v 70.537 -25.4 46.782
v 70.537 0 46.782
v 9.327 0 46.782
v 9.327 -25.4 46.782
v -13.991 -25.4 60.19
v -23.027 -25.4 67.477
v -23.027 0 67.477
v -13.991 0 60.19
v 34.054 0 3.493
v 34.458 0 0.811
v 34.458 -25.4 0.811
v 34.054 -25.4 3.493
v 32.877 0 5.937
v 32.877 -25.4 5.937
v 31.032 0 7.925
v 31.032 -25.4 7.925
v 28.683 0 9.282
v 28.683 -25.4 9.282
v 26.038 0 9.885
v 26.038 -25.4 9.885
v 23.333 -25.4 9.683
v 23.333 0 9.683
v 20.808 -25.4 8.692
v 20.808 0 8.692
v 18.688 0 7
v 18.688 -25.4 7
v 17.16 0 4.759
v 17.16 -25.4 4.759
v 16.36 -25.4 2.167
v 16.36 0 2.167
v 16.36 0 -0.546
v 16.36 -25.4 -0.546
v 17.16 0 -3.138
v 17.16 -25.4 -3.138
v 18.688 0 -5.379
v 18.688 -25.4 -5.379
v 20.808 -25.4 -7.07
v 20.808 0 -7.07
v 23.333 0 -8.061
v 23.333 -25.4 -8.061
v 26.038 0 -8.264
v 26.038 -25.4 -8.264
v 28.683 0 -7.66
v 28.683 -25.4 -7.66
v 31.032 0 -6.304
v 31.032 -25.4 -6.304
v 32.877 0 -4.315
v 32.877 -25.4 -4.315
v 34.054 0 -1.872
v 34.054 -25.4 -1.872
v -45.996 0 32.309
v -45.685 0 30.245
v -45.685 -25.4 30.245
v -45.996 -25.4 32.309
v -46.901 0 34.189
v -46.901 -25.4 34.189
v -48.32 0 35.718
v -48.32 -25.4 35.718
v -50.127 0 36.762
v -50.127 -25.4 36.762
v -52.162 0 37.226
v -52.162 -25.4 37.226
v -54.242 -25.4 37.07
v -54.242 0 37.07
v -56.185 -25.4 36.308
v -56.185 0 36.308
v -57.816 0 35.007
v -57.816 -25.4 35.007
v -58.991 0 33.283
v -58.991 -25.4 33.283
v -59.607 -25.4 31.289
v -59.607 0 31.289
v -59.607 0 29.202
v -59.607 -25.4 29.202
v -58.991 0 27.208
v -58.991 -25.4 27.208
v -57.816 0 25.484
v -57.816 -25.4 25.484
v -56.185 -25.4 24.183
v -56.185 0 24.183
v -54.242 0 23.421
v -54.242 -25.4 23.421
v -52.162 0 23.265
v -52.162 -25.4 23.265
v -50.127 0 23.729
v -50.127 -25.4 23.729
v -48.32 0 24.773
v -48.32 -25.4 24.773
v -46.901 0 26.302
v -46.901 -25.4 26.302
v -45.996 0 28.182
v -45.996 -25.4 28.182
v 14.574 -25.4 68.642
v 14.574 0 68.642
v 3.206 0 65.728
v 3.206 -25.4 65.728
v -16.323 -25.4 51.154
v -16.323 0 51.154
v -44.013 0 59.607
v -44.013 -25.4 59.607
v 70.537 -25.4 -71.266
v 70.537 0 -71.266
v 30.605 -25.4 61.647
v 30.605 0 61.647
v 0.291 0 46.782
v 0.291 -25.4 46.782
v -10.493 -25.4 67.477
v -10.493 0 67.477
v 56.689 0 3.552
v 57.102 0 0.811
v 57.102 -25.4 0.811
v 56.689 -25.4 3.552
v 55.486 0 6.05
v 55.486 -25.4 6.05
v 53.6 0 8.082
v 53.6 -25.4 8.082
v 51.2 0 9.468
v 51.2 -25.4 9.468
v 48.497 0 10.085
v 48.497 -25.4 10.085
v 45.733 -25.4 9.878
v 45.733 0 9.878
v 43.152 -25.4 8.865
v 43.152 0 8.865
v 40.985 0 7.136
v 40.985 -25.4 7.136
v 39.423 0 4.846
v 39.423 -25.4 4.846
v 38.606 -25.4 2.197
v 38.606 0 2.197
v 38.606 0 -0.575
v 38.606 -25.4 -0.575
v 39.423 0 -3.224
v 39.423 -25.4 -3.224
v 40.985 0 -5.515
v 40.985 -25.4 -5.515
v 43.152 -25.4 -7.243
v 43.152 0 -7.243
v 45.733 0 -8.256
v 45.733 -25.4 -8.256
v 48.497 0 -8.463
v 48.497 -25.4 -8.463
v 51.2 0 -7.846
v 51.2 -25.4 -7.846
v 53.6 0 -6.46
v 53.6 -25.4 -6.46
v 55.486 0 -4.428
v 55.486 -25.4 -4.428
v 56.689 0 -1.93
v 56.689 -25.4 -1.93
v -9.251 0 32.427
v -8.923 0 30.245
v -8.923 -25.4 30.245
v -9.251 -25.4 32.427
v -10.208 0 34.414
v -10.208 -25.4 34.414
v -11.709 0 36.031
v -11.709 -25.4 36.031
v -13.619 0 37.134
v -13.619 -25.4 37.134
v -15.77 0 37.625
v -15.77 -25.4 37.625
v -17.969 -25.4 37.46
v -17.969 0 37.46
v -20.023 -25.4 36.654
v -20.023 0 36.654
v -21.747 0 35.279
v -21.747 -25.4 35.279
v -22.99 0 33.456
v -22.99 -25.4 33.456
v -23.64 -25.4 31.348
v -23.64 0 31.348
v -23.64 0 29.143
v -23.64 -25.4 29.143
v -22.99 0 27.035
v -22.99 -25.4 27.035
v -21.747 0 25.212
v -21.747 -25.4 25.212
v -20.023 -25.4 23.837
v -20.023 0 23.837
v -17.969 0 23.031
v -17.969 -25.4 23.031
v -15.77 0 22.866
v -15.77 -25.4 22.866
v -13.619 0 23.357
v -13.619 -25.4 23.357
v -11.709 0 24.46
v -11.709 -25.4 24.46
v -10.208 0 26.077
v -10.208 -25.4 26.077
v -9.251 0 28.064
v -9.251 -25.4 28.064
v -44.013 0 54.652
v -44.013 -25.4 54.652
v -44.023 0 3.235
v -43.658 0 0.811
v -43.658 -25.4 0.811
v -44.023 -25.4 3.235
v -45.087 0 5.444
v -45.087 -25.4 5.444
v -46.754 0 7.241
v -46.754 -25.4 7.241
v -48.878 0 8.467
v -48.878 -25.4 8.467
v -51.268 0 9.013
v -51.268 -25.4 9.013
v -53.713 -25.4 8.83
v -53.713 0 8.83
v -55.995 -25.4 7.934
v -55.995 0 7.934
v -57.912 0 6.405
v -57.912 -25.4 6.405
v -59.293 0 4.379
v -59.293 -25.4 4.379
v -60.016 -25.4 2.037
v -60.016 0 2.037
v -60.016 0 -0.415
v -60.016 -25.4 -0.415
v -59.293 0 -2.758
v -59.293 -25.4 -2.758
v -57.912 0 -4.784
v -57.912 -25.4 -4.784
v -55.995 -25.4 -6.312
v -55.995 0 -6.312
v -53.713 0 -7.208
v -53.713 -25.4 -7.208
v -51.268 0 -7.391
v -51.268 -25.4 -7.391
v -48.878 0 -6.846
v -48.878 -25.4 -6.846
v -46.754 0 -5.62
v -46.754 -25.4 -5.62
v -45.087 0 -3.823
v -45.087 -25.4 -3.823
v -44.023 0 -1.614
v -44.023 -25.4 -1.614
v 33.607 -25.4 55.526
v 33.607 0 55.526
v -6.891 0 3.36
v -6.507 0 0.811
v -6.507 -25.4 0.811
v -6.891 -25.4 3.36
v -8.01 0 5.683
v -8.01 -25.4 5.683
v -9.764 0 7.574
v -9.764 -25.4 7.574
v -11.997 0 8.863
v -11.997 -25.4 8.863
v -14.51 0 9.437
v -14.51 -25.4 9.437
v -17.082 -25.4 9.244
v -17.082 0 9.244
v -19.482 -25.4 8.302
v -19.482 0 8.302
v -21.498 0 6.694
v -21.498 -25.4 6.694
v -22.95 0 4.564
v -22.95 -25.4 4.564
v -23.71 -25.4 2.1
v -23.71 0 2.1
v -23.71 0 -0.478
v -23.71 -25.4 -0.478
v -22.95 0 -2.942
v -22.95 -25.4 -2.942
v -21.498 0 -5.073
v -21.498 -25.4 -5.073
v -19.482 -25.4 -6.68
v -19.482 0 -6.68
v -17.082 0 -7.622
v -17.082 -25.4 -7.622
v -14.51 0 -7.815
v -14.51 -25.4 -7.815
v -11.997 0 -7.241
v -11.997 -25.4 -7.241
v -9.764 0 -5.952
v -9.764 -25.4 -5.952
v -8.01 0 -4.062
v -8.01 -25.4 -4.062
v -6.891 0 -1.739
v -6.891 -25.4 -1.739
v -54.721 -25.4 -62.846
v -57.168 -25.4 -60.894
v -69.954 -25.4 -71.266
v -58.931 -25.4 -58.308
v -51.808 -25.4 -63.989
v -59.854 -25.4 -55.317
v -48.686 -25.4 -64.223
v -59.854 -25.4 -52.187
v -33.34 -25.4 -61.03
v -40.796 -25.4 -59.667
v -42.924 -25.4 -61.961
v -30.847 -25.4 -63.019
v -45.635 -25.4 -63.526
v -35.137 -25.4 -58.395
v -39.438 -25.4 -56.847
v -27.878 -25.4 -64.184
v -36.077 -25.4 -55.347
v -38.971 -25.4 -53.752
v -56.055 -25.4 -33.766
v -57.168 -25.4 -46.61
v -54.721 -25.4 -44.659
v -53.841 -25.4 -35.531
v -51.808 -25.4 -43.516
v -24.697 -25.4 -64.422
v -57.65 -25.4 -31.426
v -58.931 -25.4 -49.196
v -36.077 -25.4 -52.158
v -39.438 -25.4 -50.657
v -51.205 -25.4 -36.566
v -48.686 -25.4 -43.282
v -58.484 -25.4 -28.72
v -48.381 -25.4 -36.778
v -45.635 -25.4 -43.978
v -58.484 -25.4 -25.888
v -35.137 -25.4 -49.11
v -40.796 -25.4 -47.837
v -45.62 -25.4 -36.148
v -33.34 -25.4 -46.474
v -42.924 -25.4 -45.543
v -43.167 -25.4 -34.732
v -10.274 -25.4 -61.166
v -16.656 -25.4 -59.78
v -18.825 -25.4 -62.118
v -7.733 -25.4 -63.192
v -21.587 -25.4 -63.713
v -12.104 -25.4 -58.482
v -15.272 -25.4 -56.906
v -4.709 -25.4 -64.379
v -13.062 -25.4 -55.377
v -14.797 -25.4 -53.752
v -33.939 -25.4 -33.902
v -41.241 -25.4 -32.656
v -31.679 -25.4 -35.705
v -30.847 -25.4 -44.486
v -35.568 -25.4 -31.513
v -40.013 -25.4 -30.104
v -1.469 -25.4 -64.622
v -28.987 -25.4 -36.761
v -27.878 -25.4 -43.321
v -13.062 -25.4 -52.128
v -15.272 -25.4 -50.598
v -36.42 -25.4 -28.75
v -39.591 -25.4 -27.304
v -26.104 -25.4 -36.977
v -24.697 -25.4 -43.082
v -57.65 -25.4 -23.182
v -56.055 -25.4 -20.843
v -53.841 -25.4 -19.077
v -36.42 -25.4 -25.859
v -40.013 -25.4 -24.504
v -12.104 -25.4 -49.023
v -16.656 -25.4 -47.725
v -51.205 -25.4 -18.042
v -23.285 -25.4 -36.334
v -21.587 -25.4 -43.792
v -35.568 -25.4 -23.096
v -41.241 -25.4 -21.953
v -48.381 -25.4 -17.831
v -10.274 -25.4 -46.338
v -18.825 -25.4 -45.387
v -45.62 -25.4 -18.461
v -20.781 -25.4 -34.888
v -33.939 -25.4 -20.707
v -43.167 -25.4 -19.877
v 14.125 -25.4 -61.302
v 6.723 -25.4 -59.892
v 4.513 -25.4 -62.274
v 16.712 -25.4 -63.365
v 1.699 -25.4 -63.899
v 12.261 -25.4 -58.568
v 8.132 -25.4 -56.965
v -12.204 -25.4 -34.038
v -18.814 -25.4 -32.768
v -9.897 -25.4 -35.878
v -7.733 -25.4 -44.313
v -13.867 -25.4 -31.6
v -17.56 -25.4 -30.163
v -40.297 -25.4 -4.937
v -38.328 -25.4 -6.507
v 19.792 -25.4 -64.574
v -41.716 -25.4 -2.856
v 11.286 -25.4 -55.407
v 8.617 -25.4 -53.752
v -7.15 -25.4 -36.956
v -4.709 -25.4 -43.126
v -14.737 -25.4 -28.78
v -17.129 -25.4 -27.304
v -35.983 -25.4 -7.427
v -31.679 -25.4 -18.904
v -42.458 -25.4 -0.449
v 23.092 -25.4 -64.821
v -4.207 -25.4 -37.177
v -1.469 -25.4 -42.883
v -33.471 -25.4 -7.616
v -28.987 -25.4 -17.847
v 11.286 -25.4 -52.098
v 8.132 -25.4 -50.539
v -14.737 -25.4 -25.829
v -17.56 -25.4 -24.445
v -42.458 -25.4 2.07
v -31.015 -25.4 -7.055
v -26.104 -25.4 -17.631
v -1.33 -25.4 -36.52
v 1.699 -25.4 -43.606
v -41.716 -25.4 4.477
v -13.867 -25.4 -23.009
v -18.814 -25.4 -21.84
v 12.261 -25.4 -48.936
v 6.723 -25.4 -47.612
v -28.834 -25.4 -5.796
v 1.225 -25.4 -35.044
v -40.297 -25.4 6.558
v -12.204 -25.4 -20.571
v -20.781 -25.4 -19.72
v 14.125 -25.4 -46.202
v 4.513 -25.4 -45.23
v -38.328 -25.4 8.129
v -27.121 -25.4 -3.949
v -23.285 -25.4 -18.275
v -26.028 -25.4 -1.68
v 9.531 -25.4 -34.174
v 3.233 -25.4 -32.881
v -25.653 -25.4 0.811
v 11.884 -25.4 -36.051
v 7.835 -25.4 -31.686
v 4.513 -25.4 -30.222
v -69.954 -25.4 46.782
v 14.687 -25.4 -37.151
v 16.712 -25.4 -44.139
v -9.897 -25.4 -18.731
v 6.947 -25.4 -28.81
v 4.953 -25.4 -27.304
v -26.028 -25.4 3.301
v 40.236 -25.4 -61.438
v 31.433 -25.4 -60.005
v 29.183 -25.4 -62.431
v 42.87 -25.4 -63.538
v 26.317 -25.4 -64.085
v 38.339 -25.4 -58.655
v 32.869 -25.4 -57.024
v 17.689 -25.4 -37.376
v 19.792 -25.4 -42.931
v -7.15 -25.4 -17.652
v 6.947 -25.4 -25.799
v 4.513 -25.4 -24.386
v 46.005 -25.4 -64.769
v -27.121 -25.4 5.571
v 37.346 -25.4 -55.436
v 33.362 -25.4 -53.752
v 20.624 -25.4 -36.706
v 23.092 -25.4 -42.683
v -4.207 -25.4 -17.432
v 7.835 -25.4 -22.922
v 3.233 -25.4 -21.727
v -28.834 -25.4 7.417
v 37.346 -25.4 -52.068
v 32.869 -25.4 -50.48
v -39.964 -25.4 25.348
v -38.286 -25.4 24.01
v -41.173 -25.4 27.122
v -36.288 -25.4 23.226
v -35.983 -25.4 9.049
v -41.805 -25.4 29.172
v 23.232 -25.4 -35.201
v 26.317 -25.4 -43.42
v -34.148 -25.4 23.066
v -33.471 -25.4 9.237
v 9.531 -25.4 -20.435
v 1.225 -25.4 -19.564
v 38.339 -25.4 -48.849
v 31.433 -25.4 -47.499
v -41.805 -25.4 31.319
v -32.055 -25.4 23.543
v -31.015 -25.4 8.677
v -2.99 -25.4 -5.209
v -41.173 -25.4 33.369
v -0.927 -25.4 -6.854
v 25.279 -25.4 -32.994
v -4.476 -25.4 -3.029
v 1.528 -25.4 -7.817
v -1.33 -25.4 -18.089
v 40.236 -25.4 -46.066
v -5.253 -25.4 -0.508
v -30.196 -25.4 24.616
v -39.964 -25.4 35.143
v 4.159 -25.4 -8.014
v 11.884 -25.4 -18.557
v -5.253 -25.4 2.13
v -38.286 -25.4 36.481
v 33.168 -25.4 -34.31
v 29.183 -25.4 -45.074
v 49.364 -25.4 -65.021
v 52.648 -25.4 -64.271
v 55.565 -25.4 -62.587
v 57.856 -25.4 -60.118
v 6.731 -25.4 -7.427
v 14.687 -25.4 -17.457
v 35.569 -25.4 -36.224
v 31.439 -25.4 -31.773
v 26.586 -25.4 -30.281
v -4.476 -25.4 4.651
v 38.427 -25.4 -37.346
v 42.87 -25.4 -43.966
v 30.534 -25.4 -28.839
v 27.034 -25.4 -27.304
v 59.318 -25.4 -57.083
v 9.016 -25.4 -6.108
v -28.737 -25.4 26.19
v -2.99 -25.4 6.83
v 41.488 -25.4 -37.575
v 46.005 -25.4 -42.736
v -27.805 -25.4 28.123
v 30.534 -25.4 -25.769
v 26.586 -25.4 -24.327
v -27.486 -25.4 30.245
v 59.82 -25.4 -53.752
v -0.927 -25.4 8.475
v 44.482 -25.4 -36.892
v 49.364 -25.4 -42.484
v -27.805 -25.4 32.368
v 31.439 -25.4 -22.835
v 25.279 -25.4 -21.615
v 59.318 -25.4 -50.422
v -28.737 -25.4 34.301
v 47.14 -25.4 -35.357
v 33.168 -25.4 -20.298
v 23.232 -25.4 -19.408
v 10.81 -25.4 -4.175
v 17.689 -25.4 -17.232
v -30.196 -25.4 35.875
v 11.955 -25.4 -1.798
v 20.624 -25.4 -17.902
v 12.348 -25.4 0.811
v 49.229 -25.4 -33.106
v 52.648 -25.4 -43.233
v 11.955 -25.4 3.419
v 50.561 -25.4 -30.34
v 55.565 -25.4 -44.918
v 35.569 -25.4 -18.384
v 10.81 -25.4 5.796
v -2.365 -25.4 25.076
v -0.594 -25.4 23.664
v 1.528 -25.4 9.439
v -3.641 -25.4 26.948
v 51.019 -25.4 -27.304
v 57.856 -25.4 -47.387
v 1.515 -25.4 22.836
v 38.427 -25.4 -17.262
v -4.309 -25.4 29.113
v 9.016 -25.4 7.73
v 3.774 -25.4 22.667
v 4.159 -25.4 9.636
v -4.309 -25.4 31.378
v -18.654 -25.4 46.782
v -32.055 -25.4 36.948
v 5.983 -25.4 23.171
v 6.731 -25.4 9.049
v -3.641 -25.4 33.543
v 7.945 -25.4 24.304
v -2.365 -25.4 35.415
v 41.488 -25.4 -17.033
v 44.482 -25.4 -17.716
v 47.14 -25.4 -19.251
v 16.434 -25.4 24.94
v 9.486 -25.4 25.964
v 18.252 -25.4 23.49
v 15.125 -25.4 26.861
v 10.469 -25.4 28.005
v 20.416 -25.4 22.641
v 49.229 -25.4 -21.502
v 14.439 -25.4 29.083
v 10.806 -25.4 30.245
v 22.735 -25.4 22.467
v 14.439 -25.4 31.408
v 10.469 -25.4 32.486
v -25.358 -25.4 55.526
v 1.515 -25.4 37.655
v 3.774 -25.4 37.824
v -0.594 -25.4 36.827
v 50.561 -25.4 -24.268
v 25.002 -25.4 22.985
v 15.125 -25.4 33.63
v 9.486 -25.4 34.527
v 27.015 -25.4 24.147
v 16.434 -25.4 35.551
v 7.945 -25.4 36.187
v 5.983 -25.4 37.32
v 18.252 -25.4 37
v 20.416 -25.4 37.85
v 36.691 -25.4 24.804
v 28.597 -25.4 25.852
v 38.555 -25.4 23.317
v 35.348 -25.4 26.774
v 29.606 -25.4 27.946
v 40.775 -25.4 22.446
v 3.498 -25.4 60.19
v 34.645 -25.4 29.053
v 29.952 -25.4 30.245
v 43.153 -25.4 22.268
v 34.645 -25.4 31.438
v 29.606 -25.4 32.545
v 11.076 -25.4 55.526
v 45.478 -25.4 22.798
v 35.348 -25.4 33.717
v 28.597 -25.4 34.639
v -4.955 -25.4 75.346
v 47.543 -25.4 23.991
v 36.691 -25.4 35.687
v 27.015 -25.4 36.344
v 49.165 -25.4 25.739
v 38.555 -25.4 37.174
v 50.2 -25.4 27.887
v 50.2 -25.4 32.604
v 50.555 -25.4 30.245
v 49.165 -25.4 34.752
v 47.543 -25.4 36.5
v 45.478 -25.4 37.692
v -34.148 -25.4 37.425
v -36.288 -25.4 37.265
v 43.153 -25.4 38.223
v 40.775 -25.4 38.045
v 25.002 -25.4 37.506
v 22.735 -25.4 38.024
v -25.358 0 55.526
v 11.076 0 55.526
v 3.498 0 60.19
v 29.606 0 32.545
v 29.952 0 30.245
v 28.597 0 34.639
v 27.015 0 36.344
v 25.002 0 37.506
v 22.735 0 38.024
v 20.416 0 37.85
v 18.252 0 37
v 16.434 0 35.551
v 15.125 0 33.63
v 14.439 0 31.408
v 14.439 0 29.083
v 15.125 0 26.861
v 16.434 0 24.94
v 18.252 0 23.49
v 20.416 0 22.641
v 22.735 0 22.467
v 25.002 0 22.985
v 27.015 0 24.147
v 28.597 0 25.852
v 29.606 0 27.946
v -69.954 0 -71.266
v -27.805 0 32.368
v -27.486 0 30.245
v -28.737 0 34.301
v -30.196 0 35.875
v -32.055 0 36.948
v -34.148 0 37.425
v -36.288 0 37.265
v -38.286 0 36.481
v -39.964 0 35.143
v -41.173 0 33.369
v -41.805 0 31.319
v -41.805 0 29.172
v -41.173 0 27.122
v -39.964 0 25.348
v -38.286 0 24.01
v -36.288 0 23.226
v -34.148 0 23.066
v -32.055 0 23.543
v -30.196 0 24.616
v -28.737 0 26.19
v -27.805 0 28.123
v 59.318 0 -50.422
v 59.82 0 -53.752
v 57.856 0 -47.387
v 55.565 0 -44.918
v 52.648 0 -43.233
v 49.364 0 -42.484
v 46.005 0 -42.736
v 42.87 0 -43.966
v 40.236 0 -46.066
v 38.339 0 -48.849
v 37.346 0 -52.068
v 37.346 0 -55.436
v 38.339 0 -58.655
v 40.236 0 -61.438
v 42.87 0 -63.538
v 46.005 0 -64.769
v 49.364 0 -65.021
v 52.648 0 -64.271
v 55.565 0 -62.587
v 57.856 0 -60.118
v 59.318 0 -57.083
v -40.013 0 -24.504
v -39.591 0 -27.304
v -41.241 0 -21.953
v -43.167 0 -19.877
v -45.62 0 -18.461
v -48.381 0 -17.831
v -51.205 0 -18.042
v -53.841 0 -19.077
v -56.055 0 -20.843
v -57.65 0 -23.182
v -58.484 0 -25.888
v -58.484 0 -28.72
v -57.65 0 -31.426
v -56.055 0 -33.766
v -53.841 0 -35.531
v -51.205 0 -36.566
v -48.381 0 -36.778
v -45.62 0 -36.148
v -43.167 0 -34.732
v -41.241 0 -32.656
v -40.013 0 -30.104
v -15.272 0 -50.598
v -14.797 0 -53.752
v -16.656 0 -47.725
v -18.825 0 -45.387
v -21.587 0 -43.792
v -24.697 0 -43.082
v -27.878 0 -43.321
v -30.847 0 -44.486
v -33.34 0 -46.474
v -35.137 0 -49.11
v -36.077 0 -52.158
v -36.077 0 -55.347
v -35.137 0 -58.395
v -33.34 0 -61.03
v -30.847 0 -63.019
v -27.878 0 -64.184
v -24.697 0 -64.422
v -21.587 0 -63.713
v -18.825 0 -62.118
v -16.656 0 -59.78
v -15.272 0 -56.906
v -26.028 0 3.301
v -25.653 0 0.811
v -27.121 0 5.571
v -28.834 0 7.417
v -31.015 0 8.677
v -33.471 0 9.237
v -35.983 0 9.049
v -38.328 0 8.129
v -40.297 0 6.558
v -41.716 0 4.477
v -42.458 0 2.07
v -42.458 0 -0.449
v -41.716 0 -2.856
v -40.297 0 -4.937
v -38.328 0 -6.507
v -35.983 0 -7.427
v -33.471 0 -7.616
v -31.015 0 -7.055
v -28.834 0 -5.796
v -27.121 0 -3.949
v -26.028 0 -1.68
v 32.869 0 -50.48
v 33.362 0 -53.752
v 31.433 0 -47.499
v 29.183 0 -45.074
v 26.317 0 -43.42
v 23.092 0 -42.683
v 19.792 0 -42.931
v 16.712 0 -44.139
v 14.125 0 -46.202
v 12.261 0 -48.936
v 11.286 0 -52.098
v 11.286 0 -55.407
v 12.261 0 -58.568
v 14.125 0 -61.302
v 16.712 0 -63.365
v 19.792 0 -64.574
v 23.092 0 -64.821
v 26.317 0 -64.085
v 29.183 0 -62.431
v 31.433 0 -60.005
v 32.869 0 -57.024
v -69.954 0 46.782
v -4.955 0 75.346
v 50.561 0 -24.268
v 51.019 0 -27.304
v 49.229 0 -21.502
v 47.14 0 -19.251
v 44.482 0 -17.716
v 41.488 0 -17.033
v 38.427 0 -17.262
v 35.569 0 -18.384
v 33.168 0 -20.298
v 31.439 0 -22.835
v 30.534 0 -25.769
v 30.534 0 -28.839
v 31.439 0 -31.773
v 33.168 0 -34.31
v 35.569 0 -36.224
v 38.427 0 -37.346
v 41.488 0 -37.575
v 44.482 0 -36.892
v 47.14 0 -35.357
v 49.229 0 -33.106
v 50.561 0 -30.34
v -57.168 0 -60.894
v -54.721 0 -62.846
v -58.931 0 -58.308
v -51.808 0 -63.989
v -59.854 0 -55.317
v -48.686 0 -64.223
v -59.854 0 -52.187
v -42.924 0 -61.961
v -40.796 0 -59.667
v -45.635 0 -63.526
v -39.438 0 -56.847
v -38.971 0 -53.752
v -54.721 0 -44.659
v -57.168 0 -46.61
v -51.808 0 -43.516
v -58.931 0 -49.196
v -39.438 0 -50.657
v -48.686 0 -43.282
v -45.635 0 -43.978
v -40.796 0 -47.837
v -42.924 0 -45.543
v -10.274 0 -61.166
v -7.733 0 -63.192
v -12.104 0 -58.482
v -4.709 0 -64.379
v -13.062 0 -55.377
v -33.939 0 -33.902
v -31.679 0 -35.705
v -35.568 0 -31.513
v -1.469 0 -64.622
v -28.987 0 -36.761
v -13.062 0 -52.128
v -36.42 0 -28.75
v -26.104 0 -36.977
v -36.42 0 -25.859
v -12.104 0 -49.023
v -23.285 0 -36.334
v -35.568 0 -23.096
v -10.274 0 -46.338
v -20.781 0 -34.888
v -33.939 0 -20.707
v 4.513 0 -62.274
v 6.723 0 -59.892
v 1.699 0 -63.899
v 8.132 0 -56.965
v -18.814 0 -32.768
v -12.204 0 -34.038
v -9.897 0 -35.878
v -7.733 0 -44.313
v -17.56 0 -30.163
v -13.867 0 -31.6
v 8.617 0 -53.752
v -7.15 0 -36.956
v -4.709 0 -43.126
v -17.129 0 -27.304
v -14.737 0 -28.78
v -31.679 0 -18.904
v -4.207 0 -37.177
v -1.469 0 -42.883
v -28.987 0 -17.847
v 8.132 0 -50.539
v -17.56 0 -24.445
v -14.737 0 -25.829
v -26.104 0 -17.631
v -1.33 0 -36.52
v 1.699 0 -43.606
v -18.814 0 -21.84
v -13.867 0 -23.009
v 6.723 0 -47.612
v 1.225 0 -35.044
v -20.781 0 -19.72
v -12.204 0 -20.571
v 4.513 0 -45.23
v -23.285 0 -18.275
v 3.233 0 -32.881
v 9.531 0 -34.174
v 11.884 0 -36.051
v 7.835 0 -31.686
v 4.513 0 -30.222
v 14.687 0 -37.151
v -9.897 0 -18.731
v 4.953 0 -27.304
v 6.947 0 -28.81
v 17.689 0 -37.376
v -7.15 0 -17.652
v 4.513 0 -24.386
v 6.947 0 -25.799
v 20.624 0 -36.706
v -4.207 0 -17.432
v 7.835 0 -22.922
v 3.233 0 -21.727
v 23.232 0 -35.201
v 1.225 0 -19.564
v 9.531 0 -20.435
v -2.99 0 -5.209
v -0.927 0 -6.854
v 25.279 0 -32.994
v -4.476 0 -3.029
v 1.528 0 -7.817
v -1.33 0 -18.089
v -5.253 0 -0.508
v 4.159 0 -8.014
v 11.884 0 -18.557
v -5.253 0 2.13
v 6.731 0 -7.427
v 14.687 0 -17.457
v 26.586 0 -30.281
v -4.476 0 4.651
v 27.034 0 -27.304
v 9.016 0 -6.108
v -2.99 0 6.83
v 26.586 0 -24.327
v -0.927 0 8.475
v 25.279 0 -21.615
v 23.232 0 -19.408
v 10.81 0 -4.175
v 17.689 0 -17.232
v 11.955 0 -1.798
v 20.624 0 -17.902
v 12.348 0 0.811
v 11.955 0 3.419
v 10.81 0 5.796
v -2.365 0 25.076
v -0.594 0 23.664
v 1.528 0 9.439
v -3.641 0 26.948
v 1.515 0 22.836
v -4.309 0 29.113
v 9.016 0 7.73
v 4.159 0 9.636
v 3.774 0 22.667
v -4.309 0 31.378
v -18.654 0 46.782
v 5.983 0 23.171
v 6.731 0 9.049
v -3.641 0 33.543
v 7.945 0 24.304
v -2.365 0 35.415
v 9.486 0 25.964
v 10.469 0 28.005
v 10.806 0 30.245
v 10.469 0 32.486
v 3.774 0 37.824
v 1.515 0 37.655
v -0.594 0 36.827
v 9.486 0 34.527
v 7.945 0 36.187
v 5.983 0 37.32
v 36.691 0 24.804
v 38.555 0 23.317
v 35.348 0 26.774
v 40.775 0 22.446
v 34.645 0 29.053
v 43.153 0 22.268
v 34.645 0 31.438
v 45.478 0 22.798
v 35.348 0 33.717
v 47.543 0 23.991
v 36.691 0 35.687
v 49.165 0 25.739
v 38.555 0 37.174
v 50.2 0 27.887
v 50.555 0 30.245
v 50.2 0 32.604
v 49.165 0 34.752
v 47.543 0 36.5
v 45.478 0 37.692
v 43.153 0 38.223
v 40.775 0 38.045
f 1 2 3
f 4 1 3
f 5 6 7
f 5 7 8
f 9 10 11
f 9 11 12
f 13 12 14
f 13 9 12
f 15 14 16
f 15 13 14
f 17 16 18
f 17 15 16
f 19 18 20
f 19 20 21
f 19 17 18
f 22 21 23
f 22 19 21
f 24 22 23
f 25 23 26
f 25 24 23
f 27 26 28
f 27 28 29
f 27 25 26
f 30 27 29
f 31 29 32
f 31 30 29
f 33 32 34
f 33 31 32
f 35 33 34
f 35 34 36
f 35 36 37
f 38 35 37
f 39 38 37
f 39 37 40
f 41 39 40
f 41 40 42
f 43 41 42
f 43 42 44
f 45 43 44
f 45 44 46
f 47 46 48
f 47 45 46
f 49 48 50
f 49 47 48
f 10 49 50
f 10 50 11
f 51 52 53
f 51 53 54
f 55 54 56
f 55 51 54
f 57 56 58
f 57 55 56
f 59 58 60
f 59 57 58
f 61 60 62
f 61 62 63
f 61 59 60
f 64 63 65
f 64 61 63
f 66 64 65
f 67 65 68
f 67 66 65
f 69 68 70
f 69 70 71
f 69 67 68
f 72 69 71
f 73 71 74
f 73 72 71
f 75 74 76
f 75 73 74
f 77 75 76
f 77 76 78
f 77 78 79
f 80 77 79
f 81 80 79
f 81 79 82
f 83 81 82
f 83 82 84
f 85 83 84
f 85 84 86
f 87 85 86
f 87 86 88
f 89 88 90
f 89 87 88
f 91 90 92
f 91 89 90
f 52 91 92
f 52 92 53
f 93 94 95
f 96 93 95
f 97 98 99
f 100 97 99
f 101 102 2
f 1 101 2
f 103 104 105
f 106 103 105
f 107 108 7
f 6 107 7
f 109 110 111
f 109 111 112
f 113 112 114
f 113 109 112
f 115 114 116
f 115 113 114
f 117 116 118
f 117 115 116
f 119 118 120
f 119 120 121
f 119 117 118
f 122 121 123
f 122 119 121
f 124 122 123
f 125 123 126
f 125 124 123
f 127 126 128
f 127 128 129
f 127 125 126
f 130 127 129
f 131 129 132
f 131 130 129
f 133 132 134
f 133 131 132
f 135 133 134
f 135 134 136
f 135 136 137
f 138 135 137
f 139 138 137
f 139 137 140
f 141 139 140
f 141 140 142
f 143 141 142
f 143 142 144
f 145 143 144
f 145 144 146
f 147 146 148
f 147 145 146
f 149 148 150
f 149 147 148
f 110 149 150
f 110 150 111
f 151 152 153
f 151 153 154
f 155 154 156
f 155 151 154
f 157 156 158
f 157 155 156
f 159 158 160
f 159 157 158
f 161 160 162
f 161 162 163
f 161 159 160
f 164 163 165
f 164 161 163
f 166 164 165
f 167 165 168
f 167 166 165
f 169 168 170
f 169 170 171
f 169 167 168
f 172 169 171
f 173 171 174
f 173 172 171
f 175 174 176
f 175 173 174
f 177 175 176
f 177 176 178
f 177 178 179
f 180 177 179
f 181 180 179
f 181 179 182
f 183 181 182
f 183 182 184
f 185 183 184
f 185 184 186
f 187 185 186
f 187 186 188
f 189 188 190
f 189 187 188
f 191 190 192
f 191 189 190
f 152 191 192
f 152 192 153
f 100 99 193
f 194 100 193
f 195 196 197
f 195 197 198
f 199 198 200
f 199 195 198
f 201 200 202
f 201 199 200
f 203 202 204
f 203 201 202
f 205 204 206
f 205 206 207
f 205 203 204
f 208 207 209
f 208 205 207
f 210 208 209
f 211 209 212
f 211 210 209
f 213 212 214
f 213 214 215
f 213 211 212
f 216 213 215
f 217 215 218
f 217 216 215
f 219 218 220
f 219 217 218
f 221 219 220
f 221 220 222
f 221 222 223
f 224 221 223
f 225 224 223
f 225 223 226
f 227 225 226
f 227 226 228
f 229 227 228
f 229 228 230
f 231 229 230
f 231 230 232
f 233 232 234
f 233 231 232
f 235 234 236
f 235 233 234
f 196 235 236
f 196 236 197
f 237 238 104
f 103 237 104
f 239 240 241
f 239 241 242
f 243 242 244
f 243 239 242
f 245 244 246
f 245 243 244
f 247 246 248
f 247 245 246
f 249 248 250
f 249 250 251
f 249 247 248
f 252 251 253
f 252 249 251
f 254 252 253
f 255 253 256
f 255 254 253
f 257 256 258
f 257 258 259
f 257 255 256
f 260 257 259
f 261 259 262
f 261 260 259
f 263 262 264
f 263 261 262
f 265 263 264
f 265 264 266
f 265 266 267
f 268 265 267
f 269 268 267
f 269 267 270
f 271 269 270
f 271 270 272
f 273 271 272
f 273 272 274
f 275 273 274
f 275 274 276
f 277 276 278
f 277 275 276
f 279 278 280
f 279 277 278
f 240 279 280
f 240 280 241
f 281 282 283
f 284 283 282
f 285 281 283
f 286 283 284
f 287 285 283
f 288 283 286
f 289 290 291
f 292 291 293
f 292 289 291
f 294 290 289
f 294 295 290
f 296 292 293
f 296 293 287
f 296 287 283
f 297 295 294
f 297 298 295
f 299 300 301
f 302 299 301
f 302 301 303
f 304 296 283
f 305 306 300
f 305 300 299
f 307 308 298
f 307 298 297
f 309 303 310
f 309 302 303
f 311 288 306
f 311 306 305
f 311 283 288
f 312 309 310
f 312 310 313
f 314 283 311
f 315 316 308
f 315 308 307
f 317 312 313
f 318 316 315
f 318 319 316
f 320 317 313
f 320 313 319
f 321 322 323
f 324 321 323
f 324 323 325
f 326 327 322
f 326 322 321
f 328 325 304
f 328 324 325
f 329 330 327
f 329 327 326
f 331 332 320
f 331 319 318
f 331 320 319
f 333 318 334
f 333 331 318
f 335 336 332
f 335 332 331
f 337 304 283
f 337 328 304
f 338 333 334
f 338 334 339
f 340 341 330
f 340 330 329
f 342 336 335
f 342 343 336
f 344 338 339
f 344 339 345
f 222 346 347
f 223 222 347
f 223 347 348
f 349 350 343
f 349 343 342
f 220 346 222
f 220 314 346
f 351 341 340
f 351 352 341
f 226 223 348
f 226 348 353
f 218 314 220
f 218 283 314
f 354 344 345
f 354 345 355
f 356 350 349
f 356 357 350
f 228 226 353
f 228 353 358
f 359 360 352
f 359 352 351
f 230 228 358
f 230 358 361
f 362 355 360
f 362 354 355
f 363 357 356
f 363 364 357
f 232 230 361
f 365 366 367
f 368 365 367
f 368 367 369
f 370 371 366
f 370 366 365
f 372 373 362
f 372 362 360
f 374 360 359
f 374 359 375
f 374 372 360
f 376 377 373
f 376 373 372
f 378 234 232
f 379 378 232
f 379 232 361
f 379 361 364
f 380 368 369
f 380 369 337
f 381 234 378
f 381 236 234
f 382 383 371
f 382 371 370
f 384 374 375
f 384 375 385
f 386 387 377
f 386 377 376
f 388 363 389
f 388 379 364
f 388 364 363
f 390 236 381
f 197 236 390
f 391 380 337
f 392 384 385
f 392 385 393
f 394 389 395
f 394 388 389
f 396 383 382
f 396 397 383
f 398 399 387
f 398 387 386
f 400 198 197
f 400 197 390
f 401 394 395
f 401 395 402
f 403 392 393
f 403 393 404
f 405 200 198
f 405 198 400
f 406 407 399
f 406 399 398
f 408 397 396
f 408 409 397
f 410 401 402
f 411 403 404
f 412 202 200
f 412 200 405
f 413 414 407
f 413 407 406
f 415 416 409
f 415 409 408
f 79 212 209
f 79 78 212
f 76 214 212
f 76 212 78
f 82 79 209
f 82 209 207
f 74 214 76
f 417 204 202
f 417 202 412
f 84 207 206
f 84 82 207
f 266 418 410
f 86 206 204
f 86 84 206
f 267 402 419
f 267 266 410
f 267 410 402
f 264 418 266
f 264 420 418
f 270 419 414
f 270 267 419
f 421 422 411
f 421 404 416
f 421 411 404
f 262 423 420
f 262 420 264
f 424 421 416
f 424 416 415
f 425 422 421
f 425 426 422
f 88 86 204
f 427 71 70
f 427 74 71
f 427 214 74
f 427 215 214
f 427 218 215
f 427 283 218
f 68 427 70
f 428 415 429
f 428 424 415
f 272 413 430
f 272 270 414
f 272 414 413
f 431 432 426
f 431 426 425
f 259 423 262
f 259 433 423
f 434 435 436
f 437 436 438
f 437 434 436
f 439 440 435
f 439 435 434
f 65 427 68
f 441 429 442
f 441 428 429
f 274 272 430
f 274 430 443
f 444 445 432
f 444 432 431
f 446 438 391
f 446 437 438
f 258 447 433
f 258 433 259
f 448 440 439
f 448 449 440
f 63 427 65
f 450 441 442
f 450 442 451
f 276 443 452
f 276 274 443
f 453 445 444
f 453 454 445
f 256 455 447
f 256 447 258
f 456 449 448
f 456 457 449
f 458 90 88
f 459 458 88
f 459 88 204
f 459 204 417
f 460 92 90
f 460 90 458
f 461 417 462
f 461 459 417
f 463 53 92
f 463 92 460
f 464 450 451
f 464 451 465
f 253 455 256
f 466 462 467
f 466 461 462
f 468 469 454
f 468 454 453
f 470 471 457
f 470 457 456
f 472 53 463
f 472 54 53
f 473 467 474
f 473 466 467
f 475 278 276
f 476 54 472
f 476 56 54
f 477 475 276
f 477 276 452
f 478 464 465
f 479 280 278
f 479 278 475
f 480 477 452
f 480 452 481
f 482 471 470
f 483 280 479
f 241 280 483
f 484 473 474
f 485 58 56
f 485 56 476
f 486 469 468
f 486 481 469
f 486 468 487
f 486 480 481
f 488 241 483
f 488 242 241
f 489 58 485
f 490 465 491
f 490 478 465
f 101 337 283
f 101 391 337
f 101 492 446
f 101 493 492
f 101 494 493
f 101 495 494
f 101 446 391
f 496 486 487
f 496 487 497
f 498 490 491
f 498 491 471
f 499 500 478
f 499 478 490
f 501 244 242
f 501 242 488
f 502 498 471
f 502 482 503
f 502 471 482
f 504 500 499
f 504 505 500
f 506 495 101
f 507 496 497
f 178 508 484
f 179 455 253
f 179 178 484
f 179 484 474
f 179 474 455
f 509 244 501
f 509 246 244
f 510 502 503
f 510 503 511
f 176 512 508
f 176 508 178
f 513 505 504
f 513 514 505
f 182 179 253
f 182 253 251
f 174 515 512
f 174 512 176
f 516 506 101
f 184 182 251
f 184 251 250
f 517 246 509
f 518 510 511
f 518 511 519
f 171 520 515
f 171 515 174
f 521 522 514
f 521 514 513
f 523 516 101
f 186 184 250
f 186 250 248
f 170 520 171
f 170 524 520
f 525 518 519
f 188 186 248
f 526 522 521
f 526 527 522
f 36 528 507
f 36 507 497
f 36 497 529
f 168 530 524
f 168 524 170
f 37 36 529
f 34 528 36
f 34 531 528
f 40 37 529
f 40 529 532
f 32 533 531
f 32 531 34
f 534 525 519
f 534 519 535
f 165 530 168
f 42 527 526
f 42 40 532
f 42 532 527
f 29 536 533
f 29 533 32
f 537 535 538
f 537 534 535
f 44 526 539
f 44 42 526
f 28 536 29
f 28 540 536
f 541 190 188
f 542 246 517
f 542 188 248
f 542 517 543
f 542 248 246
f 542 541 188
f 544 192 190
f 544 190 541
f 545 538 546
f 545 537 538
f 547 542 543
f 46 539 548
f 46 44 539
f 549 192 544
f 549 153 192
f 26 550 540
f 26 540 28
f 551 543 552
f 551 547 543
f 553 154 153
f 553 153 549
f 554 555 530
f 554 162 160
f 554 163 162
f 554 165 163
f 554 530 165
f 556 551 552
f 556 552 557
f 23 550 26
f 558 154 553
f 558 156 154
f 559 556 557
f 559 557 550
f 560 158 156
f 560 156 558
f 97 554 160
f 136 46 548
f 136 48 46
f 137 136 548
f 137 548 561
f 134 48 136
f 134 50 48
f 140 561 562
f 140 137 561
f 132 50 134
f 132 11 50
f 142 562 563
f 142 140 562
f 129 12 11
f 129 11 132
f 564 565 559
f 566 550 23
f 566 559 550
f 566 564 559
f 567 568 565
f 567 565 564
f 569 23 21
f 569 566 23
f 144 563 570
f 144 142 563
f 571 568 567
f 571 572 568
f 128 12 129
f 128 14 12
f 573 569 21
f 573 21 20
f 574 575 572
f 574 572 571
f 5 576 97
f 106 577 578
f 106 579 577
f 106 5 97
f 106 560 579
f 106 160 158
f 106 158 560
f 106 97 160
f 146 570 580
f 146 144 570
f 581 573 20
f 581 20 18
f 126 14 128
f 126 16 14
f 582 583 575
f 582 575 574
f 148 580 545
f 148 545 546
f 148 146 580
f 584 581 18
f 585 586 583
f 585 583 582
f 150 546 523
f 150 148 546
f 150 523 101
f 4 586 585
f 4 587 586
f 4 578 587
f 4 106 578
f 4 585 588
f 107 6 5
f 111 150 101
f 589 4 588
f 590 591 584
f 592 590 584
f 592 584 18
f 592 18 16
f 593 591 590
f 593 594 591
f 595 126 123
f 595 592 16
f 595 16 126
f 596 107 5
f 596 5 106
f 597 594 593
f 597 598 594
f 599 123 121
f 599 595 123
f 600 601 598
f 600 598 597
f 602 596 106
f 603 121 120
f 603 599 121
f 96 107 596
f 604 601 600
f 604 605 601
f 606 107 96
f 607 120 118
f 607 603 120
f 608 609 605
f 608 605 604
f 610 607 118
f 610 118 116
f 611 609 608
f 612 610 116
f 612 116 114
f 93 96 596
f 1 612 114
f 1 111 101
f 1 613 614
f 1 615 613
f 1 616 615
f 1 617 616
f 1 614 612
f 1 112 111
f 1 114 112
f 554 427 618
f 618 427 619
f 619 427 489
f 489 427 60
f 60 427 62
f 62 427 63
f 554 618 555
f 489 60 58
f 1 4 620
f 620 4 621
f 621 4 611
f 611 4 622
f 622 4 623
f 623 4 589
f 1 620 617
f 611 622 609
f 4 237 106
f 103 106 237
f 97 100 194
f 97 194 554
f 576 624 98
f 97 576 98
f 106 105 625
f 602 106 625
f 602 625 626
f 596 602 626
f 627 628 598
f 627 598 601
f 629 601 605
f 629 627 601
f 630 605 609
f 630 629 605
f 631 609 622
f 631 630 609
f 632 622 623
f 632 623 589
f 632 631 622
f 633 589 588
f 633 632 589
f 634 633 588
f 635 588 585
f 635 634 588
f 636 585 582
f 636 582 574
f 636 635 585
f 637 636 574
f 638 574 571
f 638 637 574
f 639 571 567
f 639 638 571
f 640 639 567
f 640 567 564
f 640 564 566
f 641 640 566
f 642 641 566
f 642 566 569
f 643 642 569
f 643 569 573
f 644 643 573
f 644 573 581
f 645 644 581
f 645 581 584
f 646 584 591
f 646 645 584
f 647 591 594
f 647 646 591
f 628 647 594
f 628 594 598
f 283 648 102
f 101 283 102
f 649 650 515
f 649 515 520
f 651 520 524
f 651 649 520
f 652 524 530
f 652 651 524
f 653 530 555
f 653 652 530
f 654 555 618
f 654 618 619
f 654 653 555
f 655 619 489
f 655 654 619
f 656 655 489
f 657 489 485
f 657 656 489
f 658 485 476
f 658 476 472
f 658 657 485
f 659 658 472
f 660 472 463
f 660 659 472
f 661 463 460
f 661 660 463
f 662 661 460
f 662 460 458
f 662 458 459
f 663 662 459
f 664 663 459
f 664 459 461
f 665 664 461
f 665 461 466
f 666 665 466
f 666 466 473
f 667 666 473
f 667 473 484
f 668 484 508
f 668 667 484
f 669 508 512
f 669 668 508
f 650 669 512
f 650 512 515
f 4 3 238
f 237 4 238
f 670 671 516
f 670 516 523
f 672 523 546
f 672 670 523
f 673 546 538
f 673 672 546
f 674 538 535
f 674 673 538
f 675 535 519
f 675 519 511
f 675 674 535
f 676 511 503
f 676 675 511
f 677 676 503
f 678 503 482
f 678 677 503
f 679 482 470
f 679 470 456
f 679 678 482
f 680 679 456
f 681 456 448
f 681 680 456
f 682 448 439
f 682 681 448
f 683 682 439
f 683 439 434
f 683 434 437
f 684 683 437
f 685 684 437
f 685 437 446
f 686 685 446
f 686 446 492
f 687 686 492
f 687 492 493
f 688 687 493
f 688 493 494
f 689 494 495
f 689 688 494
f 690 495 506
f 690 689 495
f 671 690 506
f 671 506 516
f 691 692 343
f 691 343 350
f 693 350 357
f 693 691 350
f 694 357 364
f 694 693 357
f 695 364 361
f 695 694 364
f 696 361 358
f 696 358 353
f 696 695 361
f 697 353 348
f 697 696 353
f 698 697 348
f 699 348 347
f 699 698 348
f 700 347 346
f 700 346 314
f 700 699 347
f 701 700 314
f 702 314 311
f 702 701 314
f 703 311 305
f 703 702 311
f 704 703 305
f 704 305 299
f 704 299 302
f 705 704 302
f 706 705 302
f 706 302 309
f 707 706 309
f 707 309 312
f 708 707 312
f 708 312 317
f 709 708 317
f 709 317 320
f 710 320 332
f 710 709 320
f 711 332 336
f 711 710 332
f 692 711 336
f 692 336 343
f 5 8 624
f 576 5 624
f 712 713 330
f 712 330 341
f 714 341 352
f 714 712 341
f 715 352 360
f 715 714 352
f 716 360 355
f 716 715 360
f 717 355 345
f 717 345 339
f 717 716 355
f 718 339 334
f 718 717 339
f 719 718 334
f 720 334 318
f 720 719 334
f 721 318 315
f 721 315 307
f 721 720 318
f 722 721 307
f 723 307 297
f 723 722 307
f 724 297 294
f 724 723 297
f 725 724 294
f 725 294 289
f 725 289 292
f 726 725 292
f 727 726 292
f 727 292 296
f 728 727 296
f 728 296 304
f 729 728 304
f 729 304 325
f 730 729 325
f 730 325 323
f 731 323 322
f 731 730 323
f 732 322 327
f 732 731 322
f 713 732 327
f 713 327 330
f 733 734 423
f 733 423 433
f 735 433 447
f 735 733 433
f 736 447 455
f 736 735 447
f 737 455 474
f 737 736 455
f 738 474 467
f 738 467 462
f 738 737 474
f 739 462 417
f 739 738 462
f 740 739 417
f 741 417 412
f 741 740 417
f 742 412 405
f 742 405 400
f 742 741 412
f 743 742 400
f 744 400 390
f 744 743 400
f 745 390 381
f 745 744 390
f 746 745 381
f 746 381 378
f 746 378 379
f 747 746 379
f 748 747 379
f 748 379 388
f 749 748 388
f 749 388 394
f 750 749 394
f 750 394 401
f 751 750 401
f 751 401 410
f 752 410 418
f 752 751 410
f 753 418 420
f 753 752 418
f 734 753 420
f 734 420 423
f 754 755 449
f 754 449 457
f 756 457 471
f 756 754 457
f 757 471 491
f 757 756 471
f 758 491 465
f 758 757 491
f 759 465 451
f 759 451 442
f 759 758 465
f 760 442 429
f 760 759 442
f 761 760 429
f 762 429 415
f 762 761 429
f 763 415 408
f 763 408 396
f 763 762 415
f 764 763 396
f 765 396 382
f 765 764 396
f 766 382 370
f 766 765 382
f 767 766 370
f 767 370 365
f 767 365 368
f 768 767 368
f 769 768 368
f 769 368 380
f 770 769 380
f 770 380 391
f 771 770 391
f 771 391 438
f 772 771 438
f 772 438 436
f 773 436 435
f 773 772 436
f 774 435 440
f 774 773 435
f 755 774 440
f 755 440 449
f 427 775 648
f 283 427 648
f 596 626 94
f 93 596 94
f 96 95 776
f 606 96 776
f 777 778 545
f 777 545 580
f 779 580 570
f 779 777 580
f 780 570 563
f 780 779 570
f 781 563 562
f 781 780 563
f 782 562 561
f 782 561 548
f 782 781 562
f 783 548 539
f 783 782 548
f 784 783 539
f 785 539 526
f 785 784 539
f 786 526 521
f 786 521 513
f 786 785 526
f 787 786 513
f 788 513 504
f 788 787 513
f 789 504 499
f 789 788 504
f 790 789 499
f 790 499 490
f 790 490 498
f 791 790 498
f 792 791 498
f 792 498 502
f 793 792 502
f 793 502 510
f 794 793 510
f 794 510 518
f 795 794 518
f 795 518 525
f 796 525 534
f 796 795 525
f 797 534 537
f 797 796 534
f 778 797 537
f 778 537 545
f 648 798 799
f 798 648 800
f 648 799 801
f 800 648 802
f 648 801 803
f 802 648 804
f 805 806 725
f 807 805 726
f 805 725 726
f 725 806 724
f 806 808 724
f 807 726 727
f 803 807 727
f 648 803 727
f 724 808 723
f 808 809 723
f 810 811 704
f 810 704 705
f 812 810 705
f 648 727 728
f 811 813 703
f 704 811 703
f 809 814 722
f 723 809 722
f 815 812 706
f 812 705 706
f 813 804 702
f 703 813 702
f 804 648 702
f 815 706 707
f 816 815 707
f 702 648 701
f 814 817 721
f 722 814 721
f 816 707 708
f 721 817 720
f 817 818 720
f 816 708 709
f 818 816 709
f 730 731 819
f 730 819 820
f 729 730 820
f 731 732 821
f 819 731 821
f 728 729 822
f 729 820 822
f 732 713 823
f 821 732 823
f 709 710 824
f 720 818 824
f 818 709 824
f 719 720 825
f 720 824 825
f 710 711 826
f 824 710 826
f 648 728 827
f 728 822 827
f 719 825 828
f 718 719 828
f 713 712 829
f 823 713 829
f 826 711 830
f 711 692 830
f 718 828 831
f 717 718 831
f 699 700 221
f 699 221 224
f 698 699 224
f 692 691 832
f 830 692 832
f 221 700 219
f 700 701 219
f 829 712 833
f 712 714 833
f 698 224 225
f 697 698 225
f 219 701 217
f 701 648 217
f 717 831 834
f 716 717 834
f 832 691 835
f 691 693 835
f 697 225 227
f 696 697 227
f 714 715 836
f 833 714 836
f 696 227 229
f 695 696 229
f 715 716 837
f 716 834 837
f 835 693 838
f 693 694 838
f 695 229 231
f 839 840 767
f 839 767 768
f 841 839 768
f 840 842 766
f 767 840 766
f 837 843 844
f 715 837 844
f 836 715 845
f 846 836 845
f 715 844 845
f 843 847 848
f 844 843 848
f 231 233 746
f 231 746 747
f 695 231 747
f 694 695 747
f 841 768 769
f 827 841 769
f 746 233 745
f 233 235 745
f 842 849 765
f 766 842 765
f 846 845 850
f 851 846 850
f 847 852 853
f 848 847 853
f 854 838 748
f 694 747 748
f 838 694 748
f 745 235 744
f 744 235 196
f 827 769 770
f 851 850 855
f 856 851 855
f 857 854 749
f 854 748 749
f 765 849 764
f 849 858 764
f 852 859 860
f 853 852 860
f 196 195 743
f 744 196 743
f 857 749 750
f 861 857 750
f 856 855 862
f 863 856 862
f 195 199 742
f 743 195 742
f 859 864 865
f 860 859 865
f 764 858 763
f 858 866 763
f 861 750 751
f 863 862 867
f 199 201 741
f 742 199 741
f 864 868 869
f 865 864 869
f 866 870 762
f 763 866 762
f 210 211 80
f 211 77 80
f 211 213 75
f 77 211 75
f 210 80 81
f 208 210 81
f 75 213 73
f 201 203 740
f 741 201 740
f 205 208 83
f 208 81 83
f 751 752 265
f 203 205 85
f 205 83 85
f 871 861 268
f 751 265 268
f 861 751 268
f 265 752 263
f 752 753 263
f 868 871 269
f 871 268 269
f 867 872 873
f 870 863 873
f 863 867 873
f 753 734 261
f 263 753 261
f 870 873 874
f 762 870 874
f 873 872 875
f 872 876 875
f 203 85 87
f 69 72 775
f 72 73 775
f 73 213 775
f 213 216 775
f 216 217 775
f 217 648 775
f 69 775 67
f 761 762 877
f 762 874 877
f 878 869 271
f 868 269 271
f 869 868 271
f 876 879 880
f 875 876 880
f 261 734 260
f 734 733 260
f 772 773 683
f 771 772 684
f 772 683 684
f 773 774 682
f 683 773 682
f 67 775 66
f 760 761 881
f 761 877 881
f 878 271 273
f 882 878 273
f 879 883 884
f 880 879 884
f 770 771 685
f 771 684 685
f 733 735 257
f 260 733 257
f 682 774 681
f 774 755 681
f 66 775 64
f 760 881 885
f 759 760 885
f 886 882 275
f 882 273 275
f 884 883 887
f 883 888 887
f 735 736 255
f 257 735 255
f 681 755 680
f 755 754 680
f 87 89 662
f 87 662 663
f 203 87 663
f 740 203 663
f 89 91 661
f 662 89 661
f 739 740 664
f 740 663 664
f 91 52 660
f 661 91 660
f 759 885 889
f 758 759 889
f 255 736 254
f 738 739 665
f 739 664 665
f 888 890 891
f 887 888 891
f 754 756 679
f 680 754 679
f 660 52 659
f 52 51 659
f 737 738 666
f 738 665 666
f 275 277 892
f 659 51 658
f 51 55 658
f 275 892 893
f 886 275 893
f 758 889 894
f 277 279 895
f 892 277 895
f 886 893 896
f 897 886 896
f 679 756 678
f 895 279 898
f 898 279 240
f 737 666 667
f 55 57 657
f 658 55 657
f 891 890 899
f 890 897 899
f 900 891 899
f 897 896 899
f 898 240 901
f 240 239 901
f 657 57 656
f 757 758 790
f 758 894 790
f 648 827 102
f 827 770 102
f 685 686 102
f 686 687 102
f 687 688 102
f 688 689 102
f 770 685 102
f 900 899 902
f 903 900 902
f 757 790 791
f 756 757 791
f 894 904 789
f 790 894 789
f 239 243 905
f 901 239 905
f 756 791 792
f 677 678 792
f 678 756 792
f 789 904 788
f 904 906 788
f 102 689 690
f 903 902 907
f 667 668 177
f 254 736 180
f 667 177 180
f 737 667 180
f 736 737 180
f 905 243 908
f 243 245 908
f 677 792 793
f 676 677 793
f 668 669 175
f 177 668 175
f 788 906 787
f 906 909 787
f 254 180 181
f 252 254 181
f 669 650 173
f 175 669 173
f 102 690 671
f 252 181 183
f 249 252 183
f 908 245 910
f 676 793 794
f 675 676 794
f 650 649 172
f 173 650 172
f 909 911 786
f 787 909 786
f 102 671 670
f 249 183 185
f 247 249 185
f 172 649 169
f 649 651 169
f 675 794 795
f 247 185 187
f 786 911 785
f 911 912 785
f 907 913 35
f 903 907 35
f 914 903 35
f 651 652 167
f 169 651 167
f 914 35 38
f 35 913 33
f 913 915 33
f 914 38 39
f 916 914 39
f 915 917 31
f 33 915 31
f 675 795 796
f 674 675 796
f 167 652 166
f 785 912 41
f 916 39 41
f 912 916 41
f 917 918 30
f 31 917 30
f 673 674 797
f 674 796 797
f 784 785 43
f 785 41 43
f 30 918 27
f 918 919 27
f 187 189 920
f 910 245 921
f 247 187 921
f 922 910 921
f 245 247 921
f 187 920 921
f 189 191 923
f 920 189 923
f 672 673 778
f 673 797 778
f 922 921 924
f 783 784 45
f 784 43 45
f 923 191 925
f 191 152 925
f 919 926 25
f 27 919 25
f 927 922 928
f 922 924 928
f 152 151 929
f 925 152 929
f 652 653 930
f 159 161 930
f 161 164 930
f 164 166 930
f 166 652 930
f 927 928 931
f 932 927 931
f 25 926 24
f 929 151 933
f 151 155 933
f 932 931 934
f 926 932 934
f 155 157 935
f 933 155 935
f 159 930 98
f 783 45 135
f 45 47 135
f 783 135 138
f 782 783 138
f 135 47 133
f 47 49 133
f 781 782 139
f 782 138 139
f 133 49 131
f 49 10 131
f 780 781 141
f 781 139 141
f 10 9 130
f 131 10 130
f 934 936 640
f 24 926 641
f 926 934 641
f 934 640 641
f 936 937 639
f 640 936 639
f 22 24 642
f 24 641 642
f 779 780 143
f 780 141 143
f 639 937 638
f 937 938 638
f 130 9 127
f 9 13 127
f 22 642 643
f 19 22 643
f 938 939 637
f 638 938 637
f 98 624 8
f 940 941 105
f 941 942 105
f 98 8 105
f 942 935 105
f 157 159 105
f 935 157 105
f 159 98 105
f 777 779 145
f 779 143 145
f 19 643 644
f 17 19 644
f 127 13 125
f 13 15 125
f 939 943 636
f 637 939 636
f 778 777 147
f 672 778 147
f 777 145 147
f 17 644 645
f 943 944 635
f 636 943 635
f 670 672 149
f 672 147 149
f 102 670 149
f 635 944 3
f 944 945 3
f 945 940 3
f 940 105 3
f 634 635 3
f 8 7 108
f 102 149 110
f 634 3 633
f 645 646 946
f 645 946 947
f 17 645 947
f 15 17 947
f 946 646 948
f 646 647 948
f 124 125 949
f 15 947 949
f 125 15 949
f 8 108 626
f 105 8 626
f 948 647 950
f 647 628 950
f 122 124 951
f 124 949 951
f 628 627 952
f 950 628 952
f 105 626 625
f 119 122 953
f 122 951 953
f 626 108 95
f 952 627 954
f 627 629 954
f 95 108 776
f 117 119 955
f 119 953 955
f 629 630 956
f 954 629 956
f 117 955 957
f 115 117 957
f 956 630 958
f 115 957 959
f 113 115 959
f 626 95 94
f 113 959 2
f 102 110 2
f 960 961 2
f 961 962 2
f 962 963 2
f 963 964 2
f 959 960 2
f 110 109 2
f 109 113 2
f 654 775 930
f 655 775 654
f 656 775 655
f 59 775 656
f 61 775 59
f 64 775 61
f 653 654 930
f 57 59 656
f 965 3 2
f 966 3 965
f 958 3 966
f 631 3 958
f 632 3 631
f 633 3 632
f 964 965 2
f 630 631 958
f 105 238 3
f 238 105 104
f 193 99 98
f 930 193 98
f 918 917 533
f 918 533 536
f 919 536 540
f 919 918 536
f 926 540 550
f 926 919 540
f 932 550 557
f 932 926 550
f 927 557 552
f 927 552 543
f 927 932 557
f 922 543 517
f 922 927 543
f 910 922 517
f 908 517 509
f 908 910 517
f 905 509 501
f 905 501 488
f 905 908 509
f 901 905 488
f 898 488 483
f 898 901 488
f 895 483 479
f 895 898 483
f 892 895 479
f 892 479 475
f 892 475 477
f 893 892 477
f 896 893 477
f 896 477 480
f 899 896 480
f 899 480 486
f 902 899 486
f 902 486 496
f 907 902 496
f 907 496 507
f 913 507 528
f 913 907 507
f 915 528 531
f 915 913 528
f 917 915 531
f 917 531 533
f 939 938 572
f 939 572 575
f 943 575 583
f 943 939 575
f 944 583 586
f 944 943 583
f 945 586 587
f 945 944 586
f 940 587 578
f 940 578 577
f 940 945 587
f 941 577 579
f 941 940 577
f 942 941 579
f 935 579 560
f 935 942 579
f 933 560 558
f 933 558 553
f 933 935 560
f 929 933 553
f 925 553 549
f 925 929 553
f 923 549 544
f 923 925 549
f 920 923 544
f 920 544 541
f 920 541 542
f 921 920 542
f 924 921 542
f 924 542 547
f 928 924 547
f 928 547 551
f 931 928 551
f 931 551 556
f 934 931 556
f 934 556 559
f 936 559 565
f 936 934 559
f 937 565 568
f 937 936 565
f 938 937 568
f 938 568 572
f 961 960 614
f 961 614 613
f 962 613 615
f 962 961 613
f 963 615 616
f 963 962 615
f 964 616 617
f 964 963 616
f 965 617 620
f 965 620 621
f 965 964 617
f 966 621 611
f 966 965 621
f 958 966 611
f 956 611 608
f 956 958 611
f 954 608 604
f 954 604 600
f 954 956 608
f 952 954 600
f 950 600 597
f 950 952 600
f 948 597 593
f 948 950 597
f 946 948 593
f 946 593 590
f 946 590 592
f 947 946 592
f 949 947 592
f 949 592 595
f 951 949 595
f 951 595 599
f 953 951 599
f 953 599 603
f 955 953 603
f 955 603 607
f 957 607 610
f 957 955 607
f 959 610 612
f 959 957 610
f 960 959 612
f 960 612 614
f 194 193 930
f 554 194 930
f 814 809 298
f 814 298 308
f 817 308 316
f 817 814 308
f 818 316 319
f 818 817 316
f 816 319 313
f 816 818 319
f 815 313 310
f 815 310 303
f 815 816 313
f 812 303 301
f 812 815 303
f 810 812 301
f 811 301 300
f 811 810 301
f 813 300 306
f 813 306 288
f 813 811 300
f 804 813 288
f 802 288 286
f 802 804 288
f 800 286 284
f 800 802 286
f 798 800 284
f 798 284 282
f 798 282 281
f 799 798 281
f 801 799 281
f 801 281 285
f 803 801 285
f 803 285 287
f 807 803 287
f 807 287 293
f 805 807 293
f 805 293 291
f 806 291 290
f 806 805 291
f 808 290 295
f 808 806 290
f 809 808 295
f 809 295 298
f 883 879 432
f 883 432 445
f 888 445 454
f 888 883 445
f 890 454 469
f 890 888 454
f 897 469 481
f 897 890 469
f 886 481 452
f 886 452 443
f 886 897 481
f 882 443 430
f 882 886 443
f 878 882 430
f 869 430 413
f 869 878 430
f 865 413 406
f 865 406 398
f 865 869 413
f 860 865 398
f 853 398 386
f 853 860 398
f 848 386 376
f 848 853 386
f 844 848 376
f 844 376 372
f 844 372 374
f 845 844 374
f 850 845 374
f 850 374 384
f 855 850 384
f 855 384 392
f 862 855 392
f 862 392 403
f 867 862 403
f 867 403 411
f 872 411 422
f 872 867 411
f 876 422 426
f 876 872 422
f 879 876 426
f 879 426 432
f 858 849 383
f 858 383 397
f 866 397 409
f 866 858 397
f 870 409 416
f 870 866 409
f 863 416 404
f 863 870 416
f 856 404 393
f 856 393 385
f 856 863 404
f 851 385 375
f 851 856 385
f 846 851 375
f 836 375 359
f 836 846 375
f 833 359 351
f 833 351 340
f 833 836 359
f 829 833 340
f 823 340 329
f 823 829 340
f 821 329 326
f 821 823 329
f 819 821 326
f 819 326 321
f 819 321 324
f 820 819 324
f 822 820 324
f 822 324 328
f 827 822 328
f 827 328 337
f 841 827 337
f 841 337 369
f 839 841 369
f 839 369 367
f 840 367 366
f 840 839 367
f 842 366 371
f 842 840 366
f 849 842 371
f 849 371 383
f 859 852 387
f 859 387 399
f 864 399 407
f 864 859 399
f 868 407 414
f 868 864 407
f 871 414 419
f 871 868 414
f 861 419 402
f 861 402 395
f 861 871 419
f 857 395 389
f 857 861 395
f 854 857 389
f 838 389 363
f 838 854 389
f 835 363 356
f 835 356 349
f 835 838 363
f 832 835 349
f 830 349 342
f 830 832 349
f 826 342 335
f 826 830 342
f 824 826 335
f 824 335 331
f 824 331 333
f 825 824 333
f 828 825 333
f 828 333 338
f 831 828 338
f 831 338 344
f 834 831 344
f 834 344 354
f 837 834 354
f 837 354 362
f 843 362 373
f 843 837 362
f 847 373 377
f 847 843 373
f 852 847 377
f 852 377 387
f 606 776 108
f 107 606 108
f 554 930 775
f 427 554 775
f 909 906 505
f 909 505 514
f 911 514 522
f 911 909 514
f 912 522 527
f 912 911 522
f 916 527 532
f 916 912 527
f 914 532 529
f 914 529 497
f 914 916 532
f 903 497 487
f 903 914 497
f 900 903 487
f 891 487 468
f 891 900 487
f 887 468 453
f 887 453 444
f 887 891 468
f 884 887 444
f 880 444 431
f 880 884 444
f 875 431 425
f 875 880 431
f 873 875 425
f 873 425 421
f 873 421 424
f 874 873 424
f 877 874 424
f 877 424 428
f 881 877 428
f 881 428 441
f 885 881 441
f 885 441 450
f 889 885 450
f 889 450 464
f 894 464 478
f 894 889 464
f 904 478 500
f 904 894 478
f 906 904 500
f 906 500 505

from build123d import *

# Parameters (mm, degrees)
F0_R     = 10.5
F0_R_2   = 10.7
F0_R_3   = 10.9
F0_R_4   = 9.5
F0_R_5   = 8.225
F0_R_6   = 9.7
F0_R_7   = 9.9
F0_R_8   = 8.45
F0_R_9   = 8.65
F0_R_10  = 11.1
F0_R_11  = 11.3
F0_R_12  = 10.1
F0_R_13  = 8.85
F0_R_14  = 9.1
F0_R_15  = 10.3
F0_R_16  = 9.3
F0_R_17  = 7
F0_R_18  = 7.2
F0_R_19  = 7.4
F0_R_20  = 7.6
F0_R_21  = 7.8
F0_R_22  = 8
F1_DEPTH = 25.4


with BuildPart() as f1:
    # F0 (on Front) → F1 (new body)
    with BuildSketch(Plane.XZ):
        Polygon((-18.654427, 46.781804), (-69.954097, 46.781804), (-69.954097, -71.265735), (70.537053, -71.265735), (70.537053, 46.781804), (9.327213, 46.781804), (33.60655, 55.526067), (30.604916, 61.647046), (0.291478, 46.781804), (11.076065, 55.526067), (3.497706, 60.189672), (14.573772, 68.64246), (3.206231, 65.727703), (-4.955082, 75.346395), (-10.493115, 67.476556), (-23.026558, 67.476556), (-13.99082, 60.189672), (-25.35836, 55.526067), (-16.322623, 51.153935), (-44.012789, 59.60672), (-44.012789, 54.65164), align=None)
        with Locations((-49.471106, -53.752262)):
            Circle(F0_R, mode=Mode.SUBTRACT)
        with Locations((-25.496647, -53.752262)):
            Circle(F0_R_2, mode=Mode.SUBTRACT)
        with Locations((-2.283281, -53.752262)):
            Circle(F0_R_3, mode=Mode.SUBTRACT)
        with Locations((-49.090561, -27.304245)):
            Circle(F0_R_4, mode=Mode.SUBTRACT)
        with Locations((-51.882625, 0.810755)):
            Circle(F0_R_5, mode=Mode.SUBTRACT)
        with Locations((-26.828561, -27.304245)):
            Circle(F0_R_6, mode=Mode.SUBTRACT)
        with Locations((-4.947111, -27.304245)):
            Circle(F0_R_7, mode=Mode.SUBTRACT)
        with Locations((-34.102622, 0.810755)):
            Circle(F0_R_8, mode=Mode.SUBTRACT)
        with Locations((-15.156722, 0.810755)):
            Circle(F0_R_9, mode=Mode.SUBTRACT)
        with Locations((22.261996, -53.752262)):
            Circle(F0_R_10, mode=Mode.SUBTRACT)
        with Locations((48.519738, -53.752262)):
            Circle(F0_R_11, mode=Mode.SUBTRACT)
        with Locations((16.934341, -27.304245)):
            Circle(F0_R_12, mode=Mode.SUBTRACT)
        with Locations((3.497706, 0.810755)):
            Circle(F0_R_13, mode=Mode.SUBTRACT)
        with Locations((25.35836, 0.810755)):
            Circle(F0_R_14, mode=Mode.SUBTRACT)
        with Locations((40.718522, -27.304245)):
            Circle(F0_R_15, mode=Mode.SUBTRACT)
        with Locations((47.801968, 0.810755)):
            Circle(F0_R_16, mode=Mode.SUBTRACT)
        with Locations((-52.684705, 30.24547)):
            Circle(F0_R_17, mode=Mode.SUBTRACT)
        with Locations((-34.685574, 30.24547)):
            Circle(F0_R_18, mode=Mode.SUBTRACT)
        with Locations((-16.322624, 30.24547)):
            Circle(F0_R_19, mode=Mode.SUBTRACT)
        with Locations((3.206231, 30.24547)):
            Circle(F0_R_20, mode=Mode.SUBTRACT)
        with Locations((22.152131, 30.24547)):
            Circle(F0_R_21, mode=Mode.SUBTRACT)
        with Locations((42.55541, 30.24547)):
            Circle(F0_R_22, mode=Mode.SUBTRACT)
    extrude(amount=F1_DEPTH)


solid = f1.part
